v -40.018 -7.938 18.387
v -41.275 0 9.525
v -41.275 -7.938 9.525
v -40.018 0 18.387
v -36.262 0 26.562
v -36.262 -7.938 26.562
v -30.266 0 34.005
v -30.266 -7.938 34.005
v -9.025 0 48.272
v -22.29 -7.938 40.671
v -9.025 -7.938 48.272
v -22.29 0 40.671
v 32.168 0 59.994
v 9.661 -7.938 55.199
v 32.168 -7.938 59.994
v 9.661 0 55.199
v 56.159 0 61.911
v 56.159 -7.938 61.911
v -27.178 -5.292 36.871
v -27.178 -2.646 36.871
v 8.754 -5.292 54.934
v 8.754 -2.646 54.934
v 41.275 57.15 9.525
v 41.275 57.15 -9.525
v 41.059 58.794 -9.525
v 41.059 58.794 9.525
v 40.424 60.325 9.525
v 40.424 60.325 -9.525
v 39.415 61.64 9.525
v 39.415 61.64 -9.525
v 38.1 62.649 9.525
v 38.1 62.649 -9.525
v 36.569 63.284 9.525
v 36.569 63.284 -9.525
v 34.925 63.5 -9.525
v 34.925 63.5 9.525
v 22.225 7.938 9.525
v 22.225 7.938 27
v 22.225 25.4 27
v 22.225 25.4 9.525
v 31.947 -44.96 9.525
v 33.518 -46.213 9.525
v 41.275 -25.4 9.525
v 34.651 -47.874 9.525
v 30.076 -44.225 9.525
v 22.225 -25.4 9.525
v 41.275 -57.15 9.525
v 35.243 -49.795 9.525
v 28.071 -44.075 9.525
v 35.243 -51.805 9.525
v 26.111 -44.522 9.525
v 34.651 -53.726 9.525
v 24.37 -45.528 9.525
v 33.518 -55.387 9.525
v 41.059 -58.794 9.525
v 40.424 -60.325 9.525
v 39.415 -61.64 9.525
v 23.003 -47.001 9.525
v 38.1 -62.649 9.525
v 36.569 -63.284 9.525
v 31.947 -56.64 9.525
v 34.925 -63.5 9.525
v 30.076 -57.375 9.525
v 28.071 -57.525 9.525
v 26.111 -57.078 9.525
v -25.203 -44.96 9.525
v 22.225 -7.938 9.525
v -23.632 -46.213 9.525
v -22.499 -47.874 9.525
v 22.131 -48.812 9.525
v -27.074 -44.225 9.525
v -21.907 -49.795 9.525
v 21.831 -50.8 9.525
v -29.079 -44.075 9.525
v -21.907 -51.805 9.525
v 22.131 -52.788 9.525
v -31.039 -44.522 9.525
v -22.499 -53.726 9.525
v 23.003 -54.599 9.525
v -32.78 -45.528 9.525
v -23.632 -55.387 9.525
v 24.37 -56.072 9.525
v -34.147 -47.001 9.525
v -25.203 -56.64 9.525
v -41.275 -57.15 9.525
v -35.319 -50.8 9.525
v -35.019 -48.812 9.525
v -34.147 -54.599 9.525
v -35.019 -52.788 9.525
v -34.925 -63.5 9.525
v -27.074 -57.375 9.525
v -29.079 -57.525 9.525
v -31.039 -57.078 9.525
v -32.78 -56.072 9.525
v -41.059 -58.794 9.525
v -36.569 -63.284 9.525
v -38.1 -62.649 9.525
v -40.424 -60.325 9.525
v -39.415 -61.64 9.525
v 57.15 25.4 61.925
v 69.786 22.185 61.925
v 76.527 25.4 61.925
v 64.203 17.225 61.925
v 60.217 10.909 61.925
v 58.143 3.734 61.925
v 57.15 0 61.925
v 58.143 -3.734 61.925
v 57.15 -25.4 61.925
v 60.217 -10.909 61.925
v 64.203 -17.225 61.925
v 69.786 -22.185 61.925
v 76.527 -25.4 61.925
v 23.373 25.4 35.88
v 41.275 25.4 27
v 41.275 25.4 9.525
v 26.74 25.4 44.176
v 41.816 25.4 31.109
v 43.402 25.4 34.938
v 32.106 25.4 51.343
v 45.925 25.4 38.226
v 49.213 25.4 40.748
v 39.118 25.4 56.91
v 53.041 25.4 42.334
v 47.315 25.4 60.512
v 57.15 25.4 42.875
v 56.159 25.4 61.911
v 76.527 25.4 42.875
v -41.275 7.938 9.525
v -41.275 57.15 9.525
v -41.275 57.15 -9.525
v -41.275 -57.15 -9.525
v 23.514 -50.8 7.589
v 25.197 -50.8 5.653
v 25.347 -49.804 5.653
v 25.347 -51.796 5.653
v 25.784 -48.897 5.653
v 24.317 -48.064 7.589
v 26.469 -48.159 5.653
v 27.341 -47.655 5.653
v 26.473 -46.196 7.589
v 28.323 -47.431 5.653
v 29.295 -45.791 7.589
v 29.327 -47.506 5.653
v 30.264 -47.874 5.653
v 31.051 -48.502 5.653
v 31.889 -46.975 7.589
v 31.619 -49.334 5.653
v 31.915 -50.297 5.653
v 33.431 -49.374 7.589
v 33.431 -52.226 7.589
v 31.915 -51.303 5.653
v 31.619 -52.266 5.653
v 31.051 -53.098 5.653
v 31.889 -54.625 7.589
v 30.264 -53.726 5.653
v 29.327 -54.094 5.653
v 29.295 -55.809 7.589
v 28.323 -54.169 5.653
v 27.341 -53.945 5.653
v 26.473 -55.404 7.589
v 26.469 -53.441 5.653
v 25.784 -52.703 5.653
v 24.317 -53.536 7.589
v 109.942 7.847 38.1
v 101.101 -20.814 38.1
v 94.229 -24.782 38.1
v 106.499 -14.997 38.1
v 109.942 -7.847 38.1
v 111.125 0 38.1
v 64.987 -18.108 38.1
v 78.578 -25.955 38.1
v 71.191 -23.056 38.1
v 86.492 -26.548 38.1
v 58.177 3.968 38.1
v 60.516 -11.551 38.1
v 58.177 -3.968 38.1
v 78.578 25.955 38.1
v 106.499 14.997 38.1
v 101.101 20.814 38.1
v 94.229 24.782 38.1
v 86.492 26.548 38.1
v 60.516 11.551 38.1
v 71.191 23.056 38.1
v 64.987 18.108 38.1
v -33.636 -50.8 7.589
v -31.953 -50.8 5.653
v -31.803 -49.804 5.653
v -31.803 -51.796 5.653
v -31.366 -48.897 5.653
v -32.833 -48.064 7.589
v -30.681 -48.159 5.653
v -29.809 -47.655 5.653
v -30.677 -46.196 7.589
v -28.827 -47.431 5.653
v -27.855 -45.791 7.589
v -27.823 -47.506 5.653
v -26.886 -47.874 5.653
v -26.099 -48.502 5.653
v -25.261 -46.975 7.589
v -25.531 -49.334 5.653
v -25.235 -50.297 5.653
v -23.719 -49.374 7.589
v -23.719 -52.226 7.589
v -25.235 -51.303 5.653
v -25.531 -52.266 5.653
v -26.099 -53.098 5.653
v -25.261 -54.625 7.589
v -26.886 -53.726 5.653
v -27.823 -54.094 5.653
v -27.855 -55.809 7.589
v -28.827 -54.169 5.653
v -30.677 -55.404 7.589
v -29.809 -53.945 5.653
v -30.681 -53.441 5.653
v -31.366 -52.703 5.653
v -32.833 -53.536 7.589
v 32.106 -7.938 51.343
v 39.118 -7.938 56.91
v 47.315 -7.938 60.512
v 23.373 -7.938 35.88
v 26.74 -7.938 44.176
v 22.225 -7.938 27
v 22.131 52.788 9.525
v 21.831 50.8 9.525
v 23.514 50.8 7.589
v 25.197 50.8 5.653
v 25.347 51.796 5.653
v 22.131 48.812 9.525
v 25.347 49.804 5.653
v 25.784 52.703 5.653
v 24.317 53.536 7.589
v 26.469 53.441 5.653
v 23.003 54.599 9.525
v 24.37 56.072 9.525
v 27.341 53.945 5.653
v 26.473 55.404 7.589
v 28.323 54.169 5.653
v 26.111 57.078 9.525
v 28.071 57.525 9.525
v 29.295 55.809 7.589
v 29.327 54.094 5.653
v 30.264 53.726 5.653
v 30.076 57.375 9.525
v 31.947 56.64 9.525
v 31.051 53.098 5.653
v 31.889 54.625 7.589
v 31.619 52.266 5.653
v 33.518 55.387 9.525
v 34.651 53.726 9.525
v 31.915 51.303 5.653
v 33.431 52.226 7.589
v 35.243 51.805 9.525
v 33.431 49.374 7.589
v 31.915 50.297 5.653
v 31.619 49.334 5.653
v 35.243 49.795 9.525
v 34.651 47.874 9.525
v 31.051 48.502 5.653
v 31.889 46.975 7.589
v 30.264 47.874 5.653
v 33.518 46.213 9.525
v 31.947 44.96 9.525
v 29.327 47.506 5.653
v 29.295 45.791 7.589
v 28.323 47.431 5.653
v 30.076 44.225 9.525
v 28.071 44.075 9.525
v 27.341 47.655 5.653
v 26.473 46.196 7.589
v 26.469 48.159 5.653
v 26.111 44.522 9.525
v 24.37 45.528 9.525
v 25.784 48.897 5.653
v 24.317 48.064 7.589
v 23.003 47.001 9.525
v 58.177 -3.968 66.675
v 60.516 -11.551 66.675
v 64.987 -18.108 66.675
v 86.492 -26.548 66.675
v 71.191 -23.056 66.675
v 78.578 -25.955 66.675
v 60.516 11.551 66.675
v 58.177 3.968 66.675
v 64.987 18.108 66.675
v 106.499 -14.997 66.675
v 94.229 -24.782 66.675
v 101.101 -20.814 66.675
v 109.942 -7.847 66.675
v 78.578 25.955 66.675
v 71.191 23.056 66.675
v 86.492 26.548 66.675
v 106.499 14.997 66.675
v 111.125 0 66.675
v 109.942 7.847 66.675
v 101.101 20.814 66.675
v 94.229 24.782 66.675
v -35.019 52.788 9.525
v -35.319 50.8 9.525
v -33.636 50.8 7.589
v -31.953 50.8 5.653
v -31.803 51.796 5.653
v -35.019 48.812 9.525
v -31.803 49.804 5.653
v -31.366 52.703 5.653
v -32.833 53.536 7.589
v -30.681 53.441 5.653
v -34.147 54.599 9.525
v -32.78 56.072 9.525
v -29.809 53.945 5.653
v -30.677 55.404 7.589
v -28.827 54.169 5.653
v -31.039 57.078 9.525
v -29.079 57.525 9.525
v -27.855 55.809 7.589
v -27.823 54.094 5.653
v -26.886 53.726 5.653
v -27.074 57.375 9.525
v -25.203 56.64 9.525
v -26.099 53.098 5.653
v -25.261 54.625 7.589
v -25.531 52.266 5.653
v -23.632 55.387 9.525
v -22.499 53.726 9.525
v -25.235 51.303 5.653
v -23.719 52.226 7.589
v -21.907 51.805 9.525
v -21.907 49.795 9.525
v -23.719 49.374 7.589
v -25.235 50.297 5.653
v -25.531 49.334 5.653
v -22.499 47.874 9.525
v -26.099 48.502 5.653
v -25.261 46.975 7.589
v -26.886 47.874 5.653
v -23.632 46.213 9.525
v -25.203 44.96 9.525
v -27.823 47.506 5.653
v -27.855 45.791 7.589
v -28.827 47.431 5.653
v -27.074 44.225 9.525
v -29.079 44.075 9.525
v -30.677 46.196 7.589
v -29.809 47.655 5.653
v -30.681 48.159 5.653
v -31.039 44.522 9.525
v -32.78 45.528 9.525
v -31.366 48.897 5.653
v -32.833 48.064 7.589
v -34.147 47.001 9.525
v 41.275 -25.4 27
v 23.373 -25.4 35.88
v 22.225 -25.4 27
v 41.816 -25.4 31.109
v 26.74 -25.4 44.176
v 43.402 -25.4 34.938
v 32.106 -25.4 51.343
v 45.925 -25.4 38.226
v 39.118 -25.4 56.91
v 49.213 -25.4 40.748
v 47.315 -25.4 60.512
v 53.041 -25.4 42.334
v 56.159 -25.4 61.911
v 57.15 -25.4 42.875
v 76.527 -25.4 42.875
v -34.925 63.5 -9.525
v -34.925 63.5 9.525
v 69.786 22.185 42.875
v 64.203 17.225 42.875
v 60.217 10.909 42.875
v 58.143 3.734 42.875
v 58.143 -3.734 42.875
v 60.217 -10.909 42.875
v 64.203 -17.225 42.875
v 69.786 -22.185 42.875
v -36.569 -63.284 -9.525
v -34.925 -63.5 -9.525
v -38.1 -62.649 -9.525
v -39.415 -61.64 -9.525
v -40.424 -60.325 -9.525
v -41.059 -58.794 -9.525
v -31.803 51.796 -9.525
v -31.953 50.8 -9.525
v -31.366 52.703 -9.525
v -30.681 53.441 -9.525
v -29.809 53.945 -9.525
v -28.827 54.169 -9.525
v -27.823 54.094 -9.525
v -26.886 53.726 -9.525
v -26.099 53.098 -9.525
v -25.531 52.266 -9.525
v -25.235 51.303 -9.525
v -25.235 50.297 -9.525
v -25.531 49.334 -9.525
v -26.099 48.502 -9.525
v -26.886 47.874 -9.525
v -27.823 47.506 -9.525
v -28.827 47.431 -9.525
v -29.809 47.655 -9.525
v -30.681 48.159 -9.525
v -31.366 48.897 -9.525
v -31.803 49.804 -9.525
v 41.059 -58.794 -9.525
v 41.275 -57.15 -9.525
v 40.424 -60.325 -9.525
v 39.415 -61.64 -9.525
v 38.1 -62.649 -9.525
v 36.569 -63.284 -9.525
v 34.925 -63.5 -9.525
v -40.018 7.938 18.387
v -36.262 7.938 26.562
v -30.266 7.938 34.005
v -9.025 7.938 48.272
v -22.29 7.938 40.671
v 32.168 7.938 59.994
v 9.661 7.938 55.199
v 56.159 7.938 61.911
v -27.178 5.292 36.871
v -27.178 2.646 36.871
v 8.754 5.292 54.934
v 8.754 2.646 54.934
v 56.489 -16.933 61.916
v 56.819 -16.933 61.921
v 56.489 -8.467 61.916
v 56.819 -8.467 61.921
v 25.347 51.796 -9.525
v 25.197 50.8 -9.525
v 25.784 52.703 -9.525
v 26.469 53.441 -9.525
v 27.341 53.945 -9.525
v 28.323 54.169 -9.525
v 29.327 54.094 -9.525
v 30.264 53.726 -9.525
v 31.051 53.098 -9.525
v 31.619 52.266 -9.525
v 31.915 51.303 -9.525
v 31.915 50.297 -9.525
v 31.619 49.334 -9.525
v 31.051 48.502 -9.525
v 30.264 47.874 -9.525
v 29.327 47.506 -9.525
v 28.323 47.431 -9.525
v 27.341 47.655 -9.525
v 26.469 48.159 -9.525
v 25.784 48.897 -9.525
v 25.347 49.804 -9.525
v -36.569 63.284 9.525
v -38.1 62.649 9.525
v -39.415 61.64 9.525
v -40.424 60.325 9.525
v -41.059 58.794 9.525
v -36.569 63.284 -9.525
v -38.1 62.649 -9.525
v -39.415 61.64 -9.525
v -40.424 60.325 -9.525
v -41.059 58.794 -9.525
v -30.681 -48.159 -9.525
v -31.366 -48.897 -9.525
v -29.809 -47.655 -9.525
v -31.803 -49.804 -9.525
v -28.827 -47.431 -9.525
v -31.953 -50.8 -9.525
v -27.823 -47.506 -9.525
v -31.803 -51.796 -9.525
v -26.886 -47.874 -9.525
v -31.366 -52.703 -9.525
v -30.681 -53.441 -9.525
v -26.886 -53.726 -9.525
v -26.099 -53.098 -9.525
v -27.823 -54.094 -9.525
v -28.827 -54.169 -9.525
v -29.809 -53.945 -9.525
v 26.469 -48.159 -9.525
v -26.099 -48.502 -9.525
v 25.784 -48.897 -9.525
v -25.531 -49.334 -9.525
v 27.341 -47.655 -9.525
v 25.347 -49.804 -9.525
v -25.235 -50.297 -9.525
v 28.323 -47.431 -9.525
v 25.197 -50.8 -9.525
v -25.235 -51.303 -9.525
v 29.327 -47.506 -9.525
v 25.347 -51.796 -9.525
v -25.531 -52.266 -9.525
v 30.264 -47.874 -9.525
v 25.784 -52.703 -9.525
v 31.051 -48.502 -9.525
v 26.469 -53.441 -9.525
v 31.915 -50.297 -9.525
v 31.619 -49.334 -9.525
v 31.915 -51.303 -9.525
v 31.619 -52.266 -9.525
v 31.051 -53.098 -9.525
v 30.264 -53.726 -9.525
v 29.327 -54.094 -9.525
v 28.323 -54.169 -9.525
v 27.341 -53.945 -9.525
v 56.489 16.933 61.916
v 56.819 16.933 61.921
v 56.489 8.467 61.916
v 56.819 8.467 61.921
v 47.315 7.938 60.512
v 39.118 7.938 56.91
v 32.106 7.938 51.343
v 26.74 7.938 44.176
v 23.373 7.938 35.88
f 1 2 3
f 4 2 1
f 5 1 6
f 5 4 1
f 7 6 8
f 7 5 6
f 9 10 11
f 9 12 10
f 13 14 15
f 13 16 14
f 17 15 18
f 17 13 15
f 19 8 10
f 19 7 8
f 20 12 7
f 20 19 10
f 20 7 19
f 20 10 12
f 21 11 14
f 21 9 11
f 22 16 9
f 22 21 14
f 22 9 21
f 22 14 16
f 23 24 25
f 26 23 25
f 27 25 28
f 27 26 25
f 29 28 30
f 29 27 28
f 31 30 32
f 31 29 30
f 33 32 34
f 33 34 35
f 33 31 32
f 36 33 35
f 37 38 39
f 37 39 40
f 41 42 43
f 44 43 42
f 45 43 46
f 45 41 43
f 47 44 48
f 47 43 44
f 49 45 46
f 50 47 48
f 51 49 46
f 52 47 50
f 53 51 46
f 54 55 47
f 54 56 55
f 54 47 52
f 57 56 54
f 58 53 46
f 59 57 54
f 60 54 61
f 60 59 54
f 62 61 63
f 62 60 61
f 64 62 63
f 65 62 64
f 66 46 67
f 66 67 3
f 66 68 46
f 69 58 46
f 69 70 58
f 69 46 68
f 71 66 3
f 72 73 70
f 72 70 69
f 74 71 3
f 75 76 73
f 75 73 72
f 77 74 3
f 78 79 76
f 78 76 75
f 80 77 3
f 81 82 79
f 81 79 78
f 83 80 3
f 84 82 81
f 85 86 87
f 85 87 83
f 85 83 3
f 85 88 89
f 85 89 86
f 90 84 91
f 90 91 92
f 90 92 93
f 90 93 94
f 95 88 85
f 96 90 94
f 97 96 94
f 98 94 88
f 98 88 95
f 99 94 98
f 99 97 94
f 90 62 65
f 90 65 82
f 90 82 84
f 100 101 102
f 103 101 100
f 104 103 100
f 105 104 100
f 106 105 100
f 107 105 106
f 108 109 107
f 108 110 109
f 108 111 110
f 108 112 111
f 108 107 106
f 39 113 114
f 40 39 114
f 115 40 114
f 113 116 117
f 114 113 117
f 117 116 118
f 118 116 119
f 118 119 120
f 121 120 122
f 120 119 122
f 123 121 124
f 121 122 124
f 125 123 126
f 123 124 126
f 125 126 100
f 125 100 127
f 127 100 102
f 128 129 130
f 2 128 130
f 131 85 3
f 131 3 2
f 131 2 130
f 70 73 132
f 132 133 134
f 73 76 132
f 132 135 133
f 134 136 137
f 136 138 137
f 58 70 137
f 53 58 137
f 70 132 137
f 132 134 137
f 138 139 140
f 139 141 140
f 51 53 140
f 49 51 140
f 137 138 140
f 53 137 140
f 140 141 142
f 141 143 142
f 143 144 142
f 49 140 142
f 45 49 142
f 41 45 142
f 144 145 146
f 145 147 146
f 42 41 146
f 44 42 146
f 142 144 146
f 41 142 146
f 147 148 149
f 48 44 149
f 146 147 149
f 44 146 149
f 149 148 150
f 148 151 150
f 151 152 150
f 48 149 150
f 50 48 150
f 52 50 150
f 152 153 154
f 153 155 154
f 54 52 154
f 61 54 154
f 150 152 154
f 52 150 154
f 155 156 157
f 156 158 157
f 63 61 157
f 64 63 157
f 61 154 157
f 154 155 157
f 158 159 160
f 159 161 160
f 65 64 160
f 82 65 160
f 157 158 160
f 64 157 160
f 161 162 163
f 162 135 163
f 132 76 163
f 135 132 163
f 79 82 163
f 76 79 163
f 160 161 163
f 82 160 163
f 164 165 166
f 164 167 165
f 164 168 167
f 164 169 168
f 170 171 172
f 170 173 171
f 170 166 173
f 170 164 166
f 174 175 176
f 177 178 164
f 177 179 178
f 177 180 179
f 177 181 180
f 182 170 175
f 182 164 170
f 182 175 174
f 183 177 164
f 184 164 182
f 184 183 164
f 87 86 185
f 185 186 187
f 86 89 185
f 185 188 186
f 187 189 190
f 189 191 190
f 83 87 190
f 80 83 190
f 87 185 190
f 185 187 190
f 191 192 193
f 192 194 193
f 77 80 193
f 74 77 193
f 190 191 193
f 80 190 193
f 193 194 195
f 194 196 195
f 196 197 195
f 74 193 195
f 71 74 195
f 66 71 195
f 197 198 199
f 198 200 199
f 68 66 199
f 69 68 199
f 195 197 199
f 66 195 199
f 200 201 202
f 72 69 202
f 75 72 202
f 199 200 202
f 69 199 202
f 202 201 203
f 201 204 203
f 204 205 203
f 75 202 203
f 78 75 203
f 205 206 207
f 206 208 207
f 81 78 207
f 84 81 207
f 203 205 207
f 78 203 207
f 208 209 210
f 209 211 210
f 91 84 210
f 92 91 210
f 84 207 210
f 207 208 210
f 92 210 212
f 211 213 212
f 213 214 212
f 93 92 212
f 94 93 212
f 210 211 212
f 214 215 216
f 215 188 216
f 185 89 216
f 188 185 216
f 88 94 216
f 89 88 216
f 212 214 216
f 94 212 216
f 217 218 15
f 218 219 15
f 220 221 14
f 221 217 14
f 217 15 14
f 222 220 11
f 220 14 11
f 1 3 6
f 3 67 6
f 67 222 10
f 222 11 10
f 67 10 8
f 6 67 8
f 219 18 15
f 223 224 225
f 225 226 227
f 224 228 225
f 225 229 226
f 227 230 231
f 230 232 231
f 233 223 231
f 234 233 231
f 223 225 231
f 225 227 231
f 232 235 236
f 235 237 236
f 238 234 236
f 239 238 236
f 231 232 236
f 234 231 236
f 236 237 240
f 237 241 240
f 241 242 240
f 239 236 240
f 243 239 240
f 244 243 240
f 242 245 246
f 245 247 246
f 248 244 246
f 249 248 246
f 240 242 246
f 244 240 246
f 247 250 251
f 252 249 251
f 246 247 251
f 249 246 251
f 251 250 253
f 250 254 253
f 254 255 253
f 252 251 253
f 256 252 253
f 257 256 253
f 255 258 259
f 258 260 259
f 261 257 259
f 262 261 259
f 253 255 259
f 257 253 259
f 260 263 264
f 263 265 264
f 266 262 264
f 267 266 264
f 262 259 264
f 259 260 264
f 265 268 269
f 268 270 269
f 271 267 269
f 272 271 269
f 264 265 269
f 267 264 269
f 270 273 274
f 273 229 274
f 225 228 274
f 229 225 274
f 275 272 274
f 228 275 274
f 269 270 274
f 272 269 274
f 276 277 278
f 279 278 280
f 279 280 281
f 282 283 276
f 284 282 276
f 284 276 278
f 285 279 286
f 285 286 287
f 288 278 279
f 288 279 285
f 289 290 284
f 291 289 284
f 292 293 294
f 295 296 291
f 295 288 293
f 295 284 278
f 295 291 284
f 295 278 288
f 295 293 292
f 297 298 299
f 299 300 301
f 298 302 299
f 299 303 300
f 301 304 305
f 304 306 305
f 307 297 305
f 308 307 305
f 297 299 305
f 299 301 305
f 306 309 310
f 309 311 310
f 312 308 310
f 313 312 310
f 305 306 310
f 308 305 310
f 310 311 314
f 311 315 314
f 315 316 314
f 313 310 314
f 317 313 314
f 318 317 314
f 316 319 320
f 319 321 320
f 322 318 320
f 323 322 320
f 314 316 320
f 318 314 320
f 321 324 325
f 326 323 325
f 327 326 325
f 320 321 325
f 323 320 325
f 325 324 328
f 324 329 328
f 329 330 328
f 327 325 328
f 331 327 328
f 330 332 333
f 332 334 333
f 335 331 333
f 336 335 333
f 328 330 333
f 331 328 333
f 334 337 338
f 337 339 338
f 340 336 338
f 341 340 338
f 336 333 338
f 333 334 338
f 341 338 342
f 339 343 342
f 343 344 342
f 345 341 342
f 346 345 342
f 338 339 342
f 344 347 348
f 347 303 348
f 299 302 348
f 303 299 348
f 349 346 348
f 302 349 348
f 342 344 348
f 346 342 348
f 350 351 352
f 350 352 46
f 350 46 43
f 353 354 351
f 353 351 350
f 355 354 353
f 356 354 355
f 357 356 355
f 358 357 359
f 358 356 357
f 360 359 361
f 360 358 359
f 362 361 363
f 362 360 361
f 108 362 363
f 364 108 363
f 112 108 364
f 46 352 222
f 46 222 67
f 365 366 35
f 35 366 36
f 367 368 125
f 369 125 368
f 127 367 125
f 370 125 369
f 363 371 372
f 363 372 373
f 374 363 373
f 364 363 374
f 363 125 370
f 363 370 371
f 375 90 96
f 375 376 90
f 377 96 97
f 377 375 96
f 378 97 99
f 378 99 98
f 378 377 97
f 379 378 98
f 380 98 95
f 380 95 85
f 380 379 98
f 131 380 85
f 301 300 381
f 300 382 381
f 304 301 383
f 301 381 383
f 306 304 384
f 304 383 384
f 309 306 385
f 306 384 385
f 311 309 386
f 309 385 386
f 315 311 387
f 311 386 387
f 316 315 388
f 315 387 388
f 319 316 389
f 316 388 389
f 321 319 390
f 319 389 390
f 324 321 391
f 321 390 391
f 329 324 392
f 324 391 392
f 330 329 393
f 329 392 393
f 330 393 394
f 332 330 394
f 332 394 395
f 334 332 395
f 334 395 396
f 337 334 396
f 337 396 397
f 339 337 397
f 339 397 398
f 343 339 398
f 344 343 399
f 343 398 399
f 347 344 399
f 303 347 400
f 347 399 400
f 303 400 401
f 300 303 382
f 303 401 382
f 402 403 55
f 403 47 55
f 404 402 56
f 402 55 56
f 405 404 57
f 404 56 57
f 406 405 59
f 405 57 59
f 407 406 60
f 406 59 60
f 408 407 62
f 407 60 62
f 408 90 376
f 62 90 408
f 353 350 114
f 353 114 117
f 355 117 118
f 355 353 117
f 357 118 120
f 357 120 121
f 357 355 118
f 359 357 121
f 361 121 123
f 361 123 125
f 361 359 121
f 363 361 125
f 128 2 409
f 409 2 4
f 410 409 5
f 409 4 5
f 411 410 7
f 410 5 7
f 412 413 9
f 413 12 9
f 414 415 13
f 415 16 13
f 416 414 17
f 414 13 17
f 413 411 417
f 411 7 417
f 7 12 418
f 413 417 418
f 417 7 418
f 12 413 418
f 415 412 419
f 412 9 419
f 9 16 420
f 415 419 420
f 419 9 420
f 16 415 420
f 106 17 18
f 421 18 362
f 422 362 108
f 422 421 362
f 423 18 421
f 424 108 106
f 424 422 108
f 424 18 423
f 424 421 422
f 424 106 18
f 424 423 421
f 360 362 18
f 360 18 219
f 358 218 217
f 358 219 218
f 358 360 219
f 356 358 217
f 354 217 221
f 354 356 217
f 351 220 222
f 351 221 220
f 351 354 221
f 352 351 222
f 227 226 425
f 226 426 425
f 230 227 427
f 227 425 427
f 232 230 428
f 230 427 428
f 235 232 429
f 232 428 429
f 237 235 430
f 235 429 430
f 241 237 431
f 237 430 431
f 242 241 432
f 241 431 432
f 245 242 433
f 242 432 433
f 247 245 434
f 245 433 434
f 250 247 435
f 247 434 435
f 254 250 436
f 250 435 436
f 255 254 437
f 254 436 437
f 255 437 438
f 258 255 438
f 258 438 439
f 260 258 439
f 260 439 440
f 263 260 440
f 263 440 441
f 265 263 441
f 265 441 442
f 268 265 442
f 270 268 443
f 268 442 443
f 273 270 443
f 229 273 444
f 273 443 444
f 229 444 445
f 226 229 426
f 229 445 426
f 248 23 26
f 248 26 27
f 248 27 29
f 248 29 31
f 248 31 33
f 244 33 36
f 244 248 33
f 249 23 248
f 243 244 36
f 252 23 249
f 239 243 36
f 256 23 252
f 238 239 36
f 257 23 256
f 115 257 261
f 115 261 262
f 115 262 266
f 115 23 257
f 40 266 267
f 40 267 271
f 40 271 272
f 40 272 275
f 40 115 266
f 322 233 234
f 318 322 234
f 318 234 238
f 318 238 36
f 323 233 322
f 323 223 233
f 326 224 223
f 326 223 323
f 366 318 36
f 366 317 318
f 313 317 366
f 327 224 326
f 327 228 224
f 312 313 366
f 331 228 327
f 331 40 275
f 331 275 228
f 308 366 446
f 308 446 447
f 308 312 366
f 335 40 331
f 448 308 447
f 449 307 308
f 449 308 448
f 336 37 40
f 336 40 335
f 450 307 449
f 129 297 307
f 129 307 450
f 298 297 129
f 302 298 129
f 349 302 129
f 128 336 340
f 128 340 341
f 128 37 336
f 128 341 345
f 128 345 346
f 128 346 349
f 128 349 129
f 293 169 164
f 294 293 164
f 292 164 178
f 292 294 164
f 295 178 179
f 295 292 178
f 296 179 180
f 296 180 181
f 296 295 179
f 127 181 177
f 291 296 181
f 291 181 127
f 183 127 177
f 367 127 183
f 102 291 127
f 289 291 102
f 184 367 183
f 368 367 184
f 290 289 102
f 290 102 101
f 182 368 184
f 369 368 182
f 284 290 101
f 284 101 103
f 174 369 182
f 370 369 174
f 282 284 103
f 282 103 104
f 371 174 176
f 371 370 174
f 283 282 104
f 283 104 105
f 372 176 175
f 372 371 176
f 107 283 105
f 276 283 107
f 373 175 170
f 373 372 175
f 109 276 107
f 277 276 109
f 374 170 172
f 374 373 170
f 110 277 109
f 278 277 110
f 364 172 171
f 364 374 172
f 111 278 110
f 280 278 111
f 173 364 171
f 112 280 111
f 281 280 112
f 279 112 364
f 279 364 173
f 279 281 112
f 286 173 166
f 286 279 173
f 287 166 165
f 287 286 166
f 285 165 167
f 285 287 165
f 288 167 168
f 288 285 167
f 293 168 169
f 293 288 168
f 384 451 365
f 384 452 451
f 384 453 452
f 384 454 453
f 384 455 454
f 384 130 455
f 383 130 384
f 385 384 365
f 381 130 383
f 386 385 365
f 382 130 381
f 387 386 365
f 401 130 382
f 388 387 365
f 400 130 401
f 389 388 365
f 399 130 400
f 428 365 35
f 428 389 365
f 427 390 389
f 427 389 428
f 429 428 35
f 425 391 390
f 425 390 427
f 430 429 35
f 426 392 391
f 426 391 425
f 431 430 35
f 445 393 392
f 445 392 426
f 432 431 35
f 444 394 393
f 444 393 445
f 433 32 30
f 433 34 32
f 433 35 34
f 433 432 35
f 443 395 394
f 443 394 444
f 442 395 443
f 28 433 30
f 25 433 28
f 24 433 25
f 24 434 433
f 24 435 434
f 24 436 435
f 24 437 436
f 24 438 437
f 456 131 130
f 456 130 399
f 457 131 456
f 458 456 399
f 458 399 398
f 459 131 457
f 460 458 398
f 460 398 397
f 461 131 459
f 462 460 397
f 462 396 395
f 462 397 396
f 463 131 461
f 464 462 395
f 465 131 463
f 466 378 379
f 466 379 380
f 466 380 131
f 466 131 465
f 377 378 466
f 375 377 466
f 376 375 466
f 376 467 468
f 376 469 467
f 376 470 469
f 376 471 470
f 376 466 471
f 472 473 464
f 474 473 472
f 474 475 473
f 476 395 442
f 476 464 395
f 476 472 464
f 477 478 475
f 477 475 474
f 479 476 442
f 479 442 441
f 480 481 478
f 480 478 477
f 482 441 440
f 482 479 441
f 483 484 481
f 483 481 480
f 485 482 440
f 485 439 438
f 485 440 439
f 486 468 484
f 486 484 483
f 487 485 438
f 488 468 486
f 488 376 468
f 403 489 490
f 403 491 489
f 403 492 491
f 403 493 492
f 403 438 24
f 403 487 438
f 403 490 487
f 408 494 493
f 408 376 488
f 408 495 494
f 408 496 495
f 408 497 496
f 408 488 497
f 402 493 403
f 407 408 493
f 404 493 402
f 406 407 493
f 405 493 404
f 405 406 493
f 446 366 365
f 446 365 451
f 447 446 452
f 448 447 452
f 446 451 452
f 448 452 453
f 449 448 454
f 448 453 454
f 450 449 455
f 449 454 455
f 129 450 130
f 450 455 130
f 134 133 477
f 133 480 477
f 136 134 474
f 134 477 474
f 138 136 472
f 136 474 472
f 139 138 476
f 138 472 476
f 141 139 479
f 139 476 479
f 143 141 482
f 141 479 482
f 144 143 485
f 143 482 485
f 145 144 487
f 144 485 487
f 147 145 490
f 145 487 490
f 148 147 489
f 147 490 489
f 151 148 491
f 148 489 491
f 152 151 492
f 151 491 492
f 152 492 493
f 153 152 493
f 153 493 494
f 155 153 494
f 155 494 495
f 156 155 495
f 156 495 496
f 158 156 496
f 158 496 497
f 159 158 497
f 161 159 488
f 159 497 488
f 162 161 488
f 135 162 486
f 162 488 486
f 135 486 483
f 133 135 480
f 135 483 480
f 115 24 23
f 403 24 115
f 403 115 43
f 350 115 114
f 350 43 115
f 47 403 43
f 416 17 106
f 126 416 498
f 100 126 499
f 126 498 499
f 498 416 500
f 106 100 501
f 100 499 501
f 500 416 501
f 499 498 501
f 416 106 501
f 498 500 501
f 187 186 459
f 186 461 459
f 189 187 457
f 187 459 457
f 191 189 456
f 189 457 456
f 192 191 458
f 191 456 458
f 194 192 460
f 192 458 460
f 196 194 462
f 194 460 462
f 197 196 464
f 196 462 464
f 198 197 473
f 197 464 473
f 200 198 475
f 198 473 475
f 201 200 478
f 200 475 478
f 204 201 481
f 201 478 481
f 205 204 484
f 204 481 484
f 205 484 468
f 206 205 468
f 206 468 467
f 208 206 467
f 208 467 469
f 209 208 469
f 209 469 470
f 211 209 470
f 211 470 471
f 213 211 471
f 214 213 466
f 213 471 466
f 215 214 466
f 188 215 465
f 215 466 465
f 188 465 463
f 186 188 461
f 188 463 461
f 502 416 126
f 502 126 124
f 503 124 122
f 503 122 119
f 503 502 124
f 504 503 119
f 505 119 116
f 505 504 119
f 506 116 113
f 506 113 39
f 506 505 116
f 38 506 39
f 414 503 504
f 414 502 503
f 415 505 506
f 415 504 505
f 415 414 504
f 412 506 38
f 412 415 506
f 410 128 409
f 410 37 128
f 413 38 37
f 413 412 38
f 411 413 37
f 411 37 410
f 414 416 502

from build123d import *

# Parameters (mm, degrees)
F1_DEPTH       = 63.5
F0_W           = 24.1773966307
F0_H           = 19.05
F2_DEPTH       = 25.4
F3_DEPTH       = 7.9375
F5_R           = 6.35
F7_D           = 6.7564
F7_CSINK_D     = 13.4874
F7_CSINK_ANGLE = 82


with BuildPart() as f1:
    # F0 (on Front) → F1 (new body, symmetric)
    with BuildSketch(Plane.XZ):
        Polygon((22.225, 9.525), (-41.275, 9.525), (-41.275, -9.525), (41.275, -9.525), (41.275, 9.525), align=None)
    extrude(amount=F1_DEPTH, both=True)

    # F0 (on Front) → F2 (join, symmetric)
    with BuildSketch(Plane.XZ):
        with BuildLine():
            Line((22.225, 27.0002), (22.225, 9.525))
            Line((22.225, 9.525), (41.275, 9.525))
            Line((41.275, 9.525), (41.275, 27.0002))
            ThreePointArc((41.275, 27.0002), (45.9246798487, 38.2255201513), (57.15, 42.8752))
            Line((57.15, 42.8752), (60.325, 42.8752))
            Line((60.325, 42.8752), (60.325, 61.9252))
            Line((60.325, 61.9252), (57.15, 61.9252))
            add(Edge.make_bspline(
                [(56.1585534781, 61.9111246339), (56.4889663623, 61.9166719821), (56.8194531057, 61.9213645655), (57.15, 61.9252)],
                knots=[110.7679621102, 110.7679621102, 110.7679621102, 110.7679621102, 111.5045361635, 111.5045361635, 111.5045361635, 111.5045361635], degree=3))
            ThreePointArc((56.1585534781, 61.9111246339), (32.1062193871, 51.3428514088), (22.225, 27.0002))
        make_face()
        with Locations((72.4136983154, 52.4002)):
            Rectangle(F0_W, F0_H)
    extrude(amount=F2_DEPTH, both=True)

    # F0 (on Front) → F3 (join, symmetric)
    with BuildSketch(Plane.XZ):
        with BuildLine():
            add(Edge.make_bspline(
                [(-41.275, 9.525), (-41.5478571248, 40.9122167506), (6.4701865541, 61.0768996786), (56.1585534781, 61.9111246339)],
                knots=[0, 0, 0, 0, 110.7679621102, 110.7679621102, 110.7679621102, 110.7679621102], degree=3))
            Line((-41.275, 9.525), (22.225, 9.525))
            Line((22.225, 9.525), (22.225, 27.0002))
            ThreePointArc((22.225, 27.0002), (32.1062193871, 51.3428514088), (56.1585534781, 61.9111246339))
        make_face()
    extrude(amount=F3_DEPTH, both=True)

    # F0 (on Front) → F4 (revolve)
    with BuildSketch(Plane.XZ):
        Polygon((84.5023966307, 66.675), (84.5023966307, 61.9252), (84.5023966307, 42.8752), (84.5023966307, 38.1), (111.125, 38.1), (111.125, 66.675), align=None)
    revolve(axis=Axis((84.5023966307, 0, 52.3875), (0, 0, 1)))

    # F5
    f5_edges = [f1.edges().sort_by_distance(p)[0] for p in [
        (-41.275, -63.5, 0),
        (41.275, -63.5, 0),
        (-41.275, 63.5, 0),
        (41.275, 63.5, 0),
    ]]
    fillet(f5_edges, radius=F5_R)

    # F7 (through all)
    with Locations(Plane.XY.offset(9.525)):
        with Locations((-28.575, 50.8), (28.575, 50.8), (-28.575, -50.8), (28.575, -50.8)):
            CounterSinkHole(F7_D / 2, F7_CSINK_D / 2, counter_sink_angle=F7_CSINK_ANGLE)


solid = f1.part
